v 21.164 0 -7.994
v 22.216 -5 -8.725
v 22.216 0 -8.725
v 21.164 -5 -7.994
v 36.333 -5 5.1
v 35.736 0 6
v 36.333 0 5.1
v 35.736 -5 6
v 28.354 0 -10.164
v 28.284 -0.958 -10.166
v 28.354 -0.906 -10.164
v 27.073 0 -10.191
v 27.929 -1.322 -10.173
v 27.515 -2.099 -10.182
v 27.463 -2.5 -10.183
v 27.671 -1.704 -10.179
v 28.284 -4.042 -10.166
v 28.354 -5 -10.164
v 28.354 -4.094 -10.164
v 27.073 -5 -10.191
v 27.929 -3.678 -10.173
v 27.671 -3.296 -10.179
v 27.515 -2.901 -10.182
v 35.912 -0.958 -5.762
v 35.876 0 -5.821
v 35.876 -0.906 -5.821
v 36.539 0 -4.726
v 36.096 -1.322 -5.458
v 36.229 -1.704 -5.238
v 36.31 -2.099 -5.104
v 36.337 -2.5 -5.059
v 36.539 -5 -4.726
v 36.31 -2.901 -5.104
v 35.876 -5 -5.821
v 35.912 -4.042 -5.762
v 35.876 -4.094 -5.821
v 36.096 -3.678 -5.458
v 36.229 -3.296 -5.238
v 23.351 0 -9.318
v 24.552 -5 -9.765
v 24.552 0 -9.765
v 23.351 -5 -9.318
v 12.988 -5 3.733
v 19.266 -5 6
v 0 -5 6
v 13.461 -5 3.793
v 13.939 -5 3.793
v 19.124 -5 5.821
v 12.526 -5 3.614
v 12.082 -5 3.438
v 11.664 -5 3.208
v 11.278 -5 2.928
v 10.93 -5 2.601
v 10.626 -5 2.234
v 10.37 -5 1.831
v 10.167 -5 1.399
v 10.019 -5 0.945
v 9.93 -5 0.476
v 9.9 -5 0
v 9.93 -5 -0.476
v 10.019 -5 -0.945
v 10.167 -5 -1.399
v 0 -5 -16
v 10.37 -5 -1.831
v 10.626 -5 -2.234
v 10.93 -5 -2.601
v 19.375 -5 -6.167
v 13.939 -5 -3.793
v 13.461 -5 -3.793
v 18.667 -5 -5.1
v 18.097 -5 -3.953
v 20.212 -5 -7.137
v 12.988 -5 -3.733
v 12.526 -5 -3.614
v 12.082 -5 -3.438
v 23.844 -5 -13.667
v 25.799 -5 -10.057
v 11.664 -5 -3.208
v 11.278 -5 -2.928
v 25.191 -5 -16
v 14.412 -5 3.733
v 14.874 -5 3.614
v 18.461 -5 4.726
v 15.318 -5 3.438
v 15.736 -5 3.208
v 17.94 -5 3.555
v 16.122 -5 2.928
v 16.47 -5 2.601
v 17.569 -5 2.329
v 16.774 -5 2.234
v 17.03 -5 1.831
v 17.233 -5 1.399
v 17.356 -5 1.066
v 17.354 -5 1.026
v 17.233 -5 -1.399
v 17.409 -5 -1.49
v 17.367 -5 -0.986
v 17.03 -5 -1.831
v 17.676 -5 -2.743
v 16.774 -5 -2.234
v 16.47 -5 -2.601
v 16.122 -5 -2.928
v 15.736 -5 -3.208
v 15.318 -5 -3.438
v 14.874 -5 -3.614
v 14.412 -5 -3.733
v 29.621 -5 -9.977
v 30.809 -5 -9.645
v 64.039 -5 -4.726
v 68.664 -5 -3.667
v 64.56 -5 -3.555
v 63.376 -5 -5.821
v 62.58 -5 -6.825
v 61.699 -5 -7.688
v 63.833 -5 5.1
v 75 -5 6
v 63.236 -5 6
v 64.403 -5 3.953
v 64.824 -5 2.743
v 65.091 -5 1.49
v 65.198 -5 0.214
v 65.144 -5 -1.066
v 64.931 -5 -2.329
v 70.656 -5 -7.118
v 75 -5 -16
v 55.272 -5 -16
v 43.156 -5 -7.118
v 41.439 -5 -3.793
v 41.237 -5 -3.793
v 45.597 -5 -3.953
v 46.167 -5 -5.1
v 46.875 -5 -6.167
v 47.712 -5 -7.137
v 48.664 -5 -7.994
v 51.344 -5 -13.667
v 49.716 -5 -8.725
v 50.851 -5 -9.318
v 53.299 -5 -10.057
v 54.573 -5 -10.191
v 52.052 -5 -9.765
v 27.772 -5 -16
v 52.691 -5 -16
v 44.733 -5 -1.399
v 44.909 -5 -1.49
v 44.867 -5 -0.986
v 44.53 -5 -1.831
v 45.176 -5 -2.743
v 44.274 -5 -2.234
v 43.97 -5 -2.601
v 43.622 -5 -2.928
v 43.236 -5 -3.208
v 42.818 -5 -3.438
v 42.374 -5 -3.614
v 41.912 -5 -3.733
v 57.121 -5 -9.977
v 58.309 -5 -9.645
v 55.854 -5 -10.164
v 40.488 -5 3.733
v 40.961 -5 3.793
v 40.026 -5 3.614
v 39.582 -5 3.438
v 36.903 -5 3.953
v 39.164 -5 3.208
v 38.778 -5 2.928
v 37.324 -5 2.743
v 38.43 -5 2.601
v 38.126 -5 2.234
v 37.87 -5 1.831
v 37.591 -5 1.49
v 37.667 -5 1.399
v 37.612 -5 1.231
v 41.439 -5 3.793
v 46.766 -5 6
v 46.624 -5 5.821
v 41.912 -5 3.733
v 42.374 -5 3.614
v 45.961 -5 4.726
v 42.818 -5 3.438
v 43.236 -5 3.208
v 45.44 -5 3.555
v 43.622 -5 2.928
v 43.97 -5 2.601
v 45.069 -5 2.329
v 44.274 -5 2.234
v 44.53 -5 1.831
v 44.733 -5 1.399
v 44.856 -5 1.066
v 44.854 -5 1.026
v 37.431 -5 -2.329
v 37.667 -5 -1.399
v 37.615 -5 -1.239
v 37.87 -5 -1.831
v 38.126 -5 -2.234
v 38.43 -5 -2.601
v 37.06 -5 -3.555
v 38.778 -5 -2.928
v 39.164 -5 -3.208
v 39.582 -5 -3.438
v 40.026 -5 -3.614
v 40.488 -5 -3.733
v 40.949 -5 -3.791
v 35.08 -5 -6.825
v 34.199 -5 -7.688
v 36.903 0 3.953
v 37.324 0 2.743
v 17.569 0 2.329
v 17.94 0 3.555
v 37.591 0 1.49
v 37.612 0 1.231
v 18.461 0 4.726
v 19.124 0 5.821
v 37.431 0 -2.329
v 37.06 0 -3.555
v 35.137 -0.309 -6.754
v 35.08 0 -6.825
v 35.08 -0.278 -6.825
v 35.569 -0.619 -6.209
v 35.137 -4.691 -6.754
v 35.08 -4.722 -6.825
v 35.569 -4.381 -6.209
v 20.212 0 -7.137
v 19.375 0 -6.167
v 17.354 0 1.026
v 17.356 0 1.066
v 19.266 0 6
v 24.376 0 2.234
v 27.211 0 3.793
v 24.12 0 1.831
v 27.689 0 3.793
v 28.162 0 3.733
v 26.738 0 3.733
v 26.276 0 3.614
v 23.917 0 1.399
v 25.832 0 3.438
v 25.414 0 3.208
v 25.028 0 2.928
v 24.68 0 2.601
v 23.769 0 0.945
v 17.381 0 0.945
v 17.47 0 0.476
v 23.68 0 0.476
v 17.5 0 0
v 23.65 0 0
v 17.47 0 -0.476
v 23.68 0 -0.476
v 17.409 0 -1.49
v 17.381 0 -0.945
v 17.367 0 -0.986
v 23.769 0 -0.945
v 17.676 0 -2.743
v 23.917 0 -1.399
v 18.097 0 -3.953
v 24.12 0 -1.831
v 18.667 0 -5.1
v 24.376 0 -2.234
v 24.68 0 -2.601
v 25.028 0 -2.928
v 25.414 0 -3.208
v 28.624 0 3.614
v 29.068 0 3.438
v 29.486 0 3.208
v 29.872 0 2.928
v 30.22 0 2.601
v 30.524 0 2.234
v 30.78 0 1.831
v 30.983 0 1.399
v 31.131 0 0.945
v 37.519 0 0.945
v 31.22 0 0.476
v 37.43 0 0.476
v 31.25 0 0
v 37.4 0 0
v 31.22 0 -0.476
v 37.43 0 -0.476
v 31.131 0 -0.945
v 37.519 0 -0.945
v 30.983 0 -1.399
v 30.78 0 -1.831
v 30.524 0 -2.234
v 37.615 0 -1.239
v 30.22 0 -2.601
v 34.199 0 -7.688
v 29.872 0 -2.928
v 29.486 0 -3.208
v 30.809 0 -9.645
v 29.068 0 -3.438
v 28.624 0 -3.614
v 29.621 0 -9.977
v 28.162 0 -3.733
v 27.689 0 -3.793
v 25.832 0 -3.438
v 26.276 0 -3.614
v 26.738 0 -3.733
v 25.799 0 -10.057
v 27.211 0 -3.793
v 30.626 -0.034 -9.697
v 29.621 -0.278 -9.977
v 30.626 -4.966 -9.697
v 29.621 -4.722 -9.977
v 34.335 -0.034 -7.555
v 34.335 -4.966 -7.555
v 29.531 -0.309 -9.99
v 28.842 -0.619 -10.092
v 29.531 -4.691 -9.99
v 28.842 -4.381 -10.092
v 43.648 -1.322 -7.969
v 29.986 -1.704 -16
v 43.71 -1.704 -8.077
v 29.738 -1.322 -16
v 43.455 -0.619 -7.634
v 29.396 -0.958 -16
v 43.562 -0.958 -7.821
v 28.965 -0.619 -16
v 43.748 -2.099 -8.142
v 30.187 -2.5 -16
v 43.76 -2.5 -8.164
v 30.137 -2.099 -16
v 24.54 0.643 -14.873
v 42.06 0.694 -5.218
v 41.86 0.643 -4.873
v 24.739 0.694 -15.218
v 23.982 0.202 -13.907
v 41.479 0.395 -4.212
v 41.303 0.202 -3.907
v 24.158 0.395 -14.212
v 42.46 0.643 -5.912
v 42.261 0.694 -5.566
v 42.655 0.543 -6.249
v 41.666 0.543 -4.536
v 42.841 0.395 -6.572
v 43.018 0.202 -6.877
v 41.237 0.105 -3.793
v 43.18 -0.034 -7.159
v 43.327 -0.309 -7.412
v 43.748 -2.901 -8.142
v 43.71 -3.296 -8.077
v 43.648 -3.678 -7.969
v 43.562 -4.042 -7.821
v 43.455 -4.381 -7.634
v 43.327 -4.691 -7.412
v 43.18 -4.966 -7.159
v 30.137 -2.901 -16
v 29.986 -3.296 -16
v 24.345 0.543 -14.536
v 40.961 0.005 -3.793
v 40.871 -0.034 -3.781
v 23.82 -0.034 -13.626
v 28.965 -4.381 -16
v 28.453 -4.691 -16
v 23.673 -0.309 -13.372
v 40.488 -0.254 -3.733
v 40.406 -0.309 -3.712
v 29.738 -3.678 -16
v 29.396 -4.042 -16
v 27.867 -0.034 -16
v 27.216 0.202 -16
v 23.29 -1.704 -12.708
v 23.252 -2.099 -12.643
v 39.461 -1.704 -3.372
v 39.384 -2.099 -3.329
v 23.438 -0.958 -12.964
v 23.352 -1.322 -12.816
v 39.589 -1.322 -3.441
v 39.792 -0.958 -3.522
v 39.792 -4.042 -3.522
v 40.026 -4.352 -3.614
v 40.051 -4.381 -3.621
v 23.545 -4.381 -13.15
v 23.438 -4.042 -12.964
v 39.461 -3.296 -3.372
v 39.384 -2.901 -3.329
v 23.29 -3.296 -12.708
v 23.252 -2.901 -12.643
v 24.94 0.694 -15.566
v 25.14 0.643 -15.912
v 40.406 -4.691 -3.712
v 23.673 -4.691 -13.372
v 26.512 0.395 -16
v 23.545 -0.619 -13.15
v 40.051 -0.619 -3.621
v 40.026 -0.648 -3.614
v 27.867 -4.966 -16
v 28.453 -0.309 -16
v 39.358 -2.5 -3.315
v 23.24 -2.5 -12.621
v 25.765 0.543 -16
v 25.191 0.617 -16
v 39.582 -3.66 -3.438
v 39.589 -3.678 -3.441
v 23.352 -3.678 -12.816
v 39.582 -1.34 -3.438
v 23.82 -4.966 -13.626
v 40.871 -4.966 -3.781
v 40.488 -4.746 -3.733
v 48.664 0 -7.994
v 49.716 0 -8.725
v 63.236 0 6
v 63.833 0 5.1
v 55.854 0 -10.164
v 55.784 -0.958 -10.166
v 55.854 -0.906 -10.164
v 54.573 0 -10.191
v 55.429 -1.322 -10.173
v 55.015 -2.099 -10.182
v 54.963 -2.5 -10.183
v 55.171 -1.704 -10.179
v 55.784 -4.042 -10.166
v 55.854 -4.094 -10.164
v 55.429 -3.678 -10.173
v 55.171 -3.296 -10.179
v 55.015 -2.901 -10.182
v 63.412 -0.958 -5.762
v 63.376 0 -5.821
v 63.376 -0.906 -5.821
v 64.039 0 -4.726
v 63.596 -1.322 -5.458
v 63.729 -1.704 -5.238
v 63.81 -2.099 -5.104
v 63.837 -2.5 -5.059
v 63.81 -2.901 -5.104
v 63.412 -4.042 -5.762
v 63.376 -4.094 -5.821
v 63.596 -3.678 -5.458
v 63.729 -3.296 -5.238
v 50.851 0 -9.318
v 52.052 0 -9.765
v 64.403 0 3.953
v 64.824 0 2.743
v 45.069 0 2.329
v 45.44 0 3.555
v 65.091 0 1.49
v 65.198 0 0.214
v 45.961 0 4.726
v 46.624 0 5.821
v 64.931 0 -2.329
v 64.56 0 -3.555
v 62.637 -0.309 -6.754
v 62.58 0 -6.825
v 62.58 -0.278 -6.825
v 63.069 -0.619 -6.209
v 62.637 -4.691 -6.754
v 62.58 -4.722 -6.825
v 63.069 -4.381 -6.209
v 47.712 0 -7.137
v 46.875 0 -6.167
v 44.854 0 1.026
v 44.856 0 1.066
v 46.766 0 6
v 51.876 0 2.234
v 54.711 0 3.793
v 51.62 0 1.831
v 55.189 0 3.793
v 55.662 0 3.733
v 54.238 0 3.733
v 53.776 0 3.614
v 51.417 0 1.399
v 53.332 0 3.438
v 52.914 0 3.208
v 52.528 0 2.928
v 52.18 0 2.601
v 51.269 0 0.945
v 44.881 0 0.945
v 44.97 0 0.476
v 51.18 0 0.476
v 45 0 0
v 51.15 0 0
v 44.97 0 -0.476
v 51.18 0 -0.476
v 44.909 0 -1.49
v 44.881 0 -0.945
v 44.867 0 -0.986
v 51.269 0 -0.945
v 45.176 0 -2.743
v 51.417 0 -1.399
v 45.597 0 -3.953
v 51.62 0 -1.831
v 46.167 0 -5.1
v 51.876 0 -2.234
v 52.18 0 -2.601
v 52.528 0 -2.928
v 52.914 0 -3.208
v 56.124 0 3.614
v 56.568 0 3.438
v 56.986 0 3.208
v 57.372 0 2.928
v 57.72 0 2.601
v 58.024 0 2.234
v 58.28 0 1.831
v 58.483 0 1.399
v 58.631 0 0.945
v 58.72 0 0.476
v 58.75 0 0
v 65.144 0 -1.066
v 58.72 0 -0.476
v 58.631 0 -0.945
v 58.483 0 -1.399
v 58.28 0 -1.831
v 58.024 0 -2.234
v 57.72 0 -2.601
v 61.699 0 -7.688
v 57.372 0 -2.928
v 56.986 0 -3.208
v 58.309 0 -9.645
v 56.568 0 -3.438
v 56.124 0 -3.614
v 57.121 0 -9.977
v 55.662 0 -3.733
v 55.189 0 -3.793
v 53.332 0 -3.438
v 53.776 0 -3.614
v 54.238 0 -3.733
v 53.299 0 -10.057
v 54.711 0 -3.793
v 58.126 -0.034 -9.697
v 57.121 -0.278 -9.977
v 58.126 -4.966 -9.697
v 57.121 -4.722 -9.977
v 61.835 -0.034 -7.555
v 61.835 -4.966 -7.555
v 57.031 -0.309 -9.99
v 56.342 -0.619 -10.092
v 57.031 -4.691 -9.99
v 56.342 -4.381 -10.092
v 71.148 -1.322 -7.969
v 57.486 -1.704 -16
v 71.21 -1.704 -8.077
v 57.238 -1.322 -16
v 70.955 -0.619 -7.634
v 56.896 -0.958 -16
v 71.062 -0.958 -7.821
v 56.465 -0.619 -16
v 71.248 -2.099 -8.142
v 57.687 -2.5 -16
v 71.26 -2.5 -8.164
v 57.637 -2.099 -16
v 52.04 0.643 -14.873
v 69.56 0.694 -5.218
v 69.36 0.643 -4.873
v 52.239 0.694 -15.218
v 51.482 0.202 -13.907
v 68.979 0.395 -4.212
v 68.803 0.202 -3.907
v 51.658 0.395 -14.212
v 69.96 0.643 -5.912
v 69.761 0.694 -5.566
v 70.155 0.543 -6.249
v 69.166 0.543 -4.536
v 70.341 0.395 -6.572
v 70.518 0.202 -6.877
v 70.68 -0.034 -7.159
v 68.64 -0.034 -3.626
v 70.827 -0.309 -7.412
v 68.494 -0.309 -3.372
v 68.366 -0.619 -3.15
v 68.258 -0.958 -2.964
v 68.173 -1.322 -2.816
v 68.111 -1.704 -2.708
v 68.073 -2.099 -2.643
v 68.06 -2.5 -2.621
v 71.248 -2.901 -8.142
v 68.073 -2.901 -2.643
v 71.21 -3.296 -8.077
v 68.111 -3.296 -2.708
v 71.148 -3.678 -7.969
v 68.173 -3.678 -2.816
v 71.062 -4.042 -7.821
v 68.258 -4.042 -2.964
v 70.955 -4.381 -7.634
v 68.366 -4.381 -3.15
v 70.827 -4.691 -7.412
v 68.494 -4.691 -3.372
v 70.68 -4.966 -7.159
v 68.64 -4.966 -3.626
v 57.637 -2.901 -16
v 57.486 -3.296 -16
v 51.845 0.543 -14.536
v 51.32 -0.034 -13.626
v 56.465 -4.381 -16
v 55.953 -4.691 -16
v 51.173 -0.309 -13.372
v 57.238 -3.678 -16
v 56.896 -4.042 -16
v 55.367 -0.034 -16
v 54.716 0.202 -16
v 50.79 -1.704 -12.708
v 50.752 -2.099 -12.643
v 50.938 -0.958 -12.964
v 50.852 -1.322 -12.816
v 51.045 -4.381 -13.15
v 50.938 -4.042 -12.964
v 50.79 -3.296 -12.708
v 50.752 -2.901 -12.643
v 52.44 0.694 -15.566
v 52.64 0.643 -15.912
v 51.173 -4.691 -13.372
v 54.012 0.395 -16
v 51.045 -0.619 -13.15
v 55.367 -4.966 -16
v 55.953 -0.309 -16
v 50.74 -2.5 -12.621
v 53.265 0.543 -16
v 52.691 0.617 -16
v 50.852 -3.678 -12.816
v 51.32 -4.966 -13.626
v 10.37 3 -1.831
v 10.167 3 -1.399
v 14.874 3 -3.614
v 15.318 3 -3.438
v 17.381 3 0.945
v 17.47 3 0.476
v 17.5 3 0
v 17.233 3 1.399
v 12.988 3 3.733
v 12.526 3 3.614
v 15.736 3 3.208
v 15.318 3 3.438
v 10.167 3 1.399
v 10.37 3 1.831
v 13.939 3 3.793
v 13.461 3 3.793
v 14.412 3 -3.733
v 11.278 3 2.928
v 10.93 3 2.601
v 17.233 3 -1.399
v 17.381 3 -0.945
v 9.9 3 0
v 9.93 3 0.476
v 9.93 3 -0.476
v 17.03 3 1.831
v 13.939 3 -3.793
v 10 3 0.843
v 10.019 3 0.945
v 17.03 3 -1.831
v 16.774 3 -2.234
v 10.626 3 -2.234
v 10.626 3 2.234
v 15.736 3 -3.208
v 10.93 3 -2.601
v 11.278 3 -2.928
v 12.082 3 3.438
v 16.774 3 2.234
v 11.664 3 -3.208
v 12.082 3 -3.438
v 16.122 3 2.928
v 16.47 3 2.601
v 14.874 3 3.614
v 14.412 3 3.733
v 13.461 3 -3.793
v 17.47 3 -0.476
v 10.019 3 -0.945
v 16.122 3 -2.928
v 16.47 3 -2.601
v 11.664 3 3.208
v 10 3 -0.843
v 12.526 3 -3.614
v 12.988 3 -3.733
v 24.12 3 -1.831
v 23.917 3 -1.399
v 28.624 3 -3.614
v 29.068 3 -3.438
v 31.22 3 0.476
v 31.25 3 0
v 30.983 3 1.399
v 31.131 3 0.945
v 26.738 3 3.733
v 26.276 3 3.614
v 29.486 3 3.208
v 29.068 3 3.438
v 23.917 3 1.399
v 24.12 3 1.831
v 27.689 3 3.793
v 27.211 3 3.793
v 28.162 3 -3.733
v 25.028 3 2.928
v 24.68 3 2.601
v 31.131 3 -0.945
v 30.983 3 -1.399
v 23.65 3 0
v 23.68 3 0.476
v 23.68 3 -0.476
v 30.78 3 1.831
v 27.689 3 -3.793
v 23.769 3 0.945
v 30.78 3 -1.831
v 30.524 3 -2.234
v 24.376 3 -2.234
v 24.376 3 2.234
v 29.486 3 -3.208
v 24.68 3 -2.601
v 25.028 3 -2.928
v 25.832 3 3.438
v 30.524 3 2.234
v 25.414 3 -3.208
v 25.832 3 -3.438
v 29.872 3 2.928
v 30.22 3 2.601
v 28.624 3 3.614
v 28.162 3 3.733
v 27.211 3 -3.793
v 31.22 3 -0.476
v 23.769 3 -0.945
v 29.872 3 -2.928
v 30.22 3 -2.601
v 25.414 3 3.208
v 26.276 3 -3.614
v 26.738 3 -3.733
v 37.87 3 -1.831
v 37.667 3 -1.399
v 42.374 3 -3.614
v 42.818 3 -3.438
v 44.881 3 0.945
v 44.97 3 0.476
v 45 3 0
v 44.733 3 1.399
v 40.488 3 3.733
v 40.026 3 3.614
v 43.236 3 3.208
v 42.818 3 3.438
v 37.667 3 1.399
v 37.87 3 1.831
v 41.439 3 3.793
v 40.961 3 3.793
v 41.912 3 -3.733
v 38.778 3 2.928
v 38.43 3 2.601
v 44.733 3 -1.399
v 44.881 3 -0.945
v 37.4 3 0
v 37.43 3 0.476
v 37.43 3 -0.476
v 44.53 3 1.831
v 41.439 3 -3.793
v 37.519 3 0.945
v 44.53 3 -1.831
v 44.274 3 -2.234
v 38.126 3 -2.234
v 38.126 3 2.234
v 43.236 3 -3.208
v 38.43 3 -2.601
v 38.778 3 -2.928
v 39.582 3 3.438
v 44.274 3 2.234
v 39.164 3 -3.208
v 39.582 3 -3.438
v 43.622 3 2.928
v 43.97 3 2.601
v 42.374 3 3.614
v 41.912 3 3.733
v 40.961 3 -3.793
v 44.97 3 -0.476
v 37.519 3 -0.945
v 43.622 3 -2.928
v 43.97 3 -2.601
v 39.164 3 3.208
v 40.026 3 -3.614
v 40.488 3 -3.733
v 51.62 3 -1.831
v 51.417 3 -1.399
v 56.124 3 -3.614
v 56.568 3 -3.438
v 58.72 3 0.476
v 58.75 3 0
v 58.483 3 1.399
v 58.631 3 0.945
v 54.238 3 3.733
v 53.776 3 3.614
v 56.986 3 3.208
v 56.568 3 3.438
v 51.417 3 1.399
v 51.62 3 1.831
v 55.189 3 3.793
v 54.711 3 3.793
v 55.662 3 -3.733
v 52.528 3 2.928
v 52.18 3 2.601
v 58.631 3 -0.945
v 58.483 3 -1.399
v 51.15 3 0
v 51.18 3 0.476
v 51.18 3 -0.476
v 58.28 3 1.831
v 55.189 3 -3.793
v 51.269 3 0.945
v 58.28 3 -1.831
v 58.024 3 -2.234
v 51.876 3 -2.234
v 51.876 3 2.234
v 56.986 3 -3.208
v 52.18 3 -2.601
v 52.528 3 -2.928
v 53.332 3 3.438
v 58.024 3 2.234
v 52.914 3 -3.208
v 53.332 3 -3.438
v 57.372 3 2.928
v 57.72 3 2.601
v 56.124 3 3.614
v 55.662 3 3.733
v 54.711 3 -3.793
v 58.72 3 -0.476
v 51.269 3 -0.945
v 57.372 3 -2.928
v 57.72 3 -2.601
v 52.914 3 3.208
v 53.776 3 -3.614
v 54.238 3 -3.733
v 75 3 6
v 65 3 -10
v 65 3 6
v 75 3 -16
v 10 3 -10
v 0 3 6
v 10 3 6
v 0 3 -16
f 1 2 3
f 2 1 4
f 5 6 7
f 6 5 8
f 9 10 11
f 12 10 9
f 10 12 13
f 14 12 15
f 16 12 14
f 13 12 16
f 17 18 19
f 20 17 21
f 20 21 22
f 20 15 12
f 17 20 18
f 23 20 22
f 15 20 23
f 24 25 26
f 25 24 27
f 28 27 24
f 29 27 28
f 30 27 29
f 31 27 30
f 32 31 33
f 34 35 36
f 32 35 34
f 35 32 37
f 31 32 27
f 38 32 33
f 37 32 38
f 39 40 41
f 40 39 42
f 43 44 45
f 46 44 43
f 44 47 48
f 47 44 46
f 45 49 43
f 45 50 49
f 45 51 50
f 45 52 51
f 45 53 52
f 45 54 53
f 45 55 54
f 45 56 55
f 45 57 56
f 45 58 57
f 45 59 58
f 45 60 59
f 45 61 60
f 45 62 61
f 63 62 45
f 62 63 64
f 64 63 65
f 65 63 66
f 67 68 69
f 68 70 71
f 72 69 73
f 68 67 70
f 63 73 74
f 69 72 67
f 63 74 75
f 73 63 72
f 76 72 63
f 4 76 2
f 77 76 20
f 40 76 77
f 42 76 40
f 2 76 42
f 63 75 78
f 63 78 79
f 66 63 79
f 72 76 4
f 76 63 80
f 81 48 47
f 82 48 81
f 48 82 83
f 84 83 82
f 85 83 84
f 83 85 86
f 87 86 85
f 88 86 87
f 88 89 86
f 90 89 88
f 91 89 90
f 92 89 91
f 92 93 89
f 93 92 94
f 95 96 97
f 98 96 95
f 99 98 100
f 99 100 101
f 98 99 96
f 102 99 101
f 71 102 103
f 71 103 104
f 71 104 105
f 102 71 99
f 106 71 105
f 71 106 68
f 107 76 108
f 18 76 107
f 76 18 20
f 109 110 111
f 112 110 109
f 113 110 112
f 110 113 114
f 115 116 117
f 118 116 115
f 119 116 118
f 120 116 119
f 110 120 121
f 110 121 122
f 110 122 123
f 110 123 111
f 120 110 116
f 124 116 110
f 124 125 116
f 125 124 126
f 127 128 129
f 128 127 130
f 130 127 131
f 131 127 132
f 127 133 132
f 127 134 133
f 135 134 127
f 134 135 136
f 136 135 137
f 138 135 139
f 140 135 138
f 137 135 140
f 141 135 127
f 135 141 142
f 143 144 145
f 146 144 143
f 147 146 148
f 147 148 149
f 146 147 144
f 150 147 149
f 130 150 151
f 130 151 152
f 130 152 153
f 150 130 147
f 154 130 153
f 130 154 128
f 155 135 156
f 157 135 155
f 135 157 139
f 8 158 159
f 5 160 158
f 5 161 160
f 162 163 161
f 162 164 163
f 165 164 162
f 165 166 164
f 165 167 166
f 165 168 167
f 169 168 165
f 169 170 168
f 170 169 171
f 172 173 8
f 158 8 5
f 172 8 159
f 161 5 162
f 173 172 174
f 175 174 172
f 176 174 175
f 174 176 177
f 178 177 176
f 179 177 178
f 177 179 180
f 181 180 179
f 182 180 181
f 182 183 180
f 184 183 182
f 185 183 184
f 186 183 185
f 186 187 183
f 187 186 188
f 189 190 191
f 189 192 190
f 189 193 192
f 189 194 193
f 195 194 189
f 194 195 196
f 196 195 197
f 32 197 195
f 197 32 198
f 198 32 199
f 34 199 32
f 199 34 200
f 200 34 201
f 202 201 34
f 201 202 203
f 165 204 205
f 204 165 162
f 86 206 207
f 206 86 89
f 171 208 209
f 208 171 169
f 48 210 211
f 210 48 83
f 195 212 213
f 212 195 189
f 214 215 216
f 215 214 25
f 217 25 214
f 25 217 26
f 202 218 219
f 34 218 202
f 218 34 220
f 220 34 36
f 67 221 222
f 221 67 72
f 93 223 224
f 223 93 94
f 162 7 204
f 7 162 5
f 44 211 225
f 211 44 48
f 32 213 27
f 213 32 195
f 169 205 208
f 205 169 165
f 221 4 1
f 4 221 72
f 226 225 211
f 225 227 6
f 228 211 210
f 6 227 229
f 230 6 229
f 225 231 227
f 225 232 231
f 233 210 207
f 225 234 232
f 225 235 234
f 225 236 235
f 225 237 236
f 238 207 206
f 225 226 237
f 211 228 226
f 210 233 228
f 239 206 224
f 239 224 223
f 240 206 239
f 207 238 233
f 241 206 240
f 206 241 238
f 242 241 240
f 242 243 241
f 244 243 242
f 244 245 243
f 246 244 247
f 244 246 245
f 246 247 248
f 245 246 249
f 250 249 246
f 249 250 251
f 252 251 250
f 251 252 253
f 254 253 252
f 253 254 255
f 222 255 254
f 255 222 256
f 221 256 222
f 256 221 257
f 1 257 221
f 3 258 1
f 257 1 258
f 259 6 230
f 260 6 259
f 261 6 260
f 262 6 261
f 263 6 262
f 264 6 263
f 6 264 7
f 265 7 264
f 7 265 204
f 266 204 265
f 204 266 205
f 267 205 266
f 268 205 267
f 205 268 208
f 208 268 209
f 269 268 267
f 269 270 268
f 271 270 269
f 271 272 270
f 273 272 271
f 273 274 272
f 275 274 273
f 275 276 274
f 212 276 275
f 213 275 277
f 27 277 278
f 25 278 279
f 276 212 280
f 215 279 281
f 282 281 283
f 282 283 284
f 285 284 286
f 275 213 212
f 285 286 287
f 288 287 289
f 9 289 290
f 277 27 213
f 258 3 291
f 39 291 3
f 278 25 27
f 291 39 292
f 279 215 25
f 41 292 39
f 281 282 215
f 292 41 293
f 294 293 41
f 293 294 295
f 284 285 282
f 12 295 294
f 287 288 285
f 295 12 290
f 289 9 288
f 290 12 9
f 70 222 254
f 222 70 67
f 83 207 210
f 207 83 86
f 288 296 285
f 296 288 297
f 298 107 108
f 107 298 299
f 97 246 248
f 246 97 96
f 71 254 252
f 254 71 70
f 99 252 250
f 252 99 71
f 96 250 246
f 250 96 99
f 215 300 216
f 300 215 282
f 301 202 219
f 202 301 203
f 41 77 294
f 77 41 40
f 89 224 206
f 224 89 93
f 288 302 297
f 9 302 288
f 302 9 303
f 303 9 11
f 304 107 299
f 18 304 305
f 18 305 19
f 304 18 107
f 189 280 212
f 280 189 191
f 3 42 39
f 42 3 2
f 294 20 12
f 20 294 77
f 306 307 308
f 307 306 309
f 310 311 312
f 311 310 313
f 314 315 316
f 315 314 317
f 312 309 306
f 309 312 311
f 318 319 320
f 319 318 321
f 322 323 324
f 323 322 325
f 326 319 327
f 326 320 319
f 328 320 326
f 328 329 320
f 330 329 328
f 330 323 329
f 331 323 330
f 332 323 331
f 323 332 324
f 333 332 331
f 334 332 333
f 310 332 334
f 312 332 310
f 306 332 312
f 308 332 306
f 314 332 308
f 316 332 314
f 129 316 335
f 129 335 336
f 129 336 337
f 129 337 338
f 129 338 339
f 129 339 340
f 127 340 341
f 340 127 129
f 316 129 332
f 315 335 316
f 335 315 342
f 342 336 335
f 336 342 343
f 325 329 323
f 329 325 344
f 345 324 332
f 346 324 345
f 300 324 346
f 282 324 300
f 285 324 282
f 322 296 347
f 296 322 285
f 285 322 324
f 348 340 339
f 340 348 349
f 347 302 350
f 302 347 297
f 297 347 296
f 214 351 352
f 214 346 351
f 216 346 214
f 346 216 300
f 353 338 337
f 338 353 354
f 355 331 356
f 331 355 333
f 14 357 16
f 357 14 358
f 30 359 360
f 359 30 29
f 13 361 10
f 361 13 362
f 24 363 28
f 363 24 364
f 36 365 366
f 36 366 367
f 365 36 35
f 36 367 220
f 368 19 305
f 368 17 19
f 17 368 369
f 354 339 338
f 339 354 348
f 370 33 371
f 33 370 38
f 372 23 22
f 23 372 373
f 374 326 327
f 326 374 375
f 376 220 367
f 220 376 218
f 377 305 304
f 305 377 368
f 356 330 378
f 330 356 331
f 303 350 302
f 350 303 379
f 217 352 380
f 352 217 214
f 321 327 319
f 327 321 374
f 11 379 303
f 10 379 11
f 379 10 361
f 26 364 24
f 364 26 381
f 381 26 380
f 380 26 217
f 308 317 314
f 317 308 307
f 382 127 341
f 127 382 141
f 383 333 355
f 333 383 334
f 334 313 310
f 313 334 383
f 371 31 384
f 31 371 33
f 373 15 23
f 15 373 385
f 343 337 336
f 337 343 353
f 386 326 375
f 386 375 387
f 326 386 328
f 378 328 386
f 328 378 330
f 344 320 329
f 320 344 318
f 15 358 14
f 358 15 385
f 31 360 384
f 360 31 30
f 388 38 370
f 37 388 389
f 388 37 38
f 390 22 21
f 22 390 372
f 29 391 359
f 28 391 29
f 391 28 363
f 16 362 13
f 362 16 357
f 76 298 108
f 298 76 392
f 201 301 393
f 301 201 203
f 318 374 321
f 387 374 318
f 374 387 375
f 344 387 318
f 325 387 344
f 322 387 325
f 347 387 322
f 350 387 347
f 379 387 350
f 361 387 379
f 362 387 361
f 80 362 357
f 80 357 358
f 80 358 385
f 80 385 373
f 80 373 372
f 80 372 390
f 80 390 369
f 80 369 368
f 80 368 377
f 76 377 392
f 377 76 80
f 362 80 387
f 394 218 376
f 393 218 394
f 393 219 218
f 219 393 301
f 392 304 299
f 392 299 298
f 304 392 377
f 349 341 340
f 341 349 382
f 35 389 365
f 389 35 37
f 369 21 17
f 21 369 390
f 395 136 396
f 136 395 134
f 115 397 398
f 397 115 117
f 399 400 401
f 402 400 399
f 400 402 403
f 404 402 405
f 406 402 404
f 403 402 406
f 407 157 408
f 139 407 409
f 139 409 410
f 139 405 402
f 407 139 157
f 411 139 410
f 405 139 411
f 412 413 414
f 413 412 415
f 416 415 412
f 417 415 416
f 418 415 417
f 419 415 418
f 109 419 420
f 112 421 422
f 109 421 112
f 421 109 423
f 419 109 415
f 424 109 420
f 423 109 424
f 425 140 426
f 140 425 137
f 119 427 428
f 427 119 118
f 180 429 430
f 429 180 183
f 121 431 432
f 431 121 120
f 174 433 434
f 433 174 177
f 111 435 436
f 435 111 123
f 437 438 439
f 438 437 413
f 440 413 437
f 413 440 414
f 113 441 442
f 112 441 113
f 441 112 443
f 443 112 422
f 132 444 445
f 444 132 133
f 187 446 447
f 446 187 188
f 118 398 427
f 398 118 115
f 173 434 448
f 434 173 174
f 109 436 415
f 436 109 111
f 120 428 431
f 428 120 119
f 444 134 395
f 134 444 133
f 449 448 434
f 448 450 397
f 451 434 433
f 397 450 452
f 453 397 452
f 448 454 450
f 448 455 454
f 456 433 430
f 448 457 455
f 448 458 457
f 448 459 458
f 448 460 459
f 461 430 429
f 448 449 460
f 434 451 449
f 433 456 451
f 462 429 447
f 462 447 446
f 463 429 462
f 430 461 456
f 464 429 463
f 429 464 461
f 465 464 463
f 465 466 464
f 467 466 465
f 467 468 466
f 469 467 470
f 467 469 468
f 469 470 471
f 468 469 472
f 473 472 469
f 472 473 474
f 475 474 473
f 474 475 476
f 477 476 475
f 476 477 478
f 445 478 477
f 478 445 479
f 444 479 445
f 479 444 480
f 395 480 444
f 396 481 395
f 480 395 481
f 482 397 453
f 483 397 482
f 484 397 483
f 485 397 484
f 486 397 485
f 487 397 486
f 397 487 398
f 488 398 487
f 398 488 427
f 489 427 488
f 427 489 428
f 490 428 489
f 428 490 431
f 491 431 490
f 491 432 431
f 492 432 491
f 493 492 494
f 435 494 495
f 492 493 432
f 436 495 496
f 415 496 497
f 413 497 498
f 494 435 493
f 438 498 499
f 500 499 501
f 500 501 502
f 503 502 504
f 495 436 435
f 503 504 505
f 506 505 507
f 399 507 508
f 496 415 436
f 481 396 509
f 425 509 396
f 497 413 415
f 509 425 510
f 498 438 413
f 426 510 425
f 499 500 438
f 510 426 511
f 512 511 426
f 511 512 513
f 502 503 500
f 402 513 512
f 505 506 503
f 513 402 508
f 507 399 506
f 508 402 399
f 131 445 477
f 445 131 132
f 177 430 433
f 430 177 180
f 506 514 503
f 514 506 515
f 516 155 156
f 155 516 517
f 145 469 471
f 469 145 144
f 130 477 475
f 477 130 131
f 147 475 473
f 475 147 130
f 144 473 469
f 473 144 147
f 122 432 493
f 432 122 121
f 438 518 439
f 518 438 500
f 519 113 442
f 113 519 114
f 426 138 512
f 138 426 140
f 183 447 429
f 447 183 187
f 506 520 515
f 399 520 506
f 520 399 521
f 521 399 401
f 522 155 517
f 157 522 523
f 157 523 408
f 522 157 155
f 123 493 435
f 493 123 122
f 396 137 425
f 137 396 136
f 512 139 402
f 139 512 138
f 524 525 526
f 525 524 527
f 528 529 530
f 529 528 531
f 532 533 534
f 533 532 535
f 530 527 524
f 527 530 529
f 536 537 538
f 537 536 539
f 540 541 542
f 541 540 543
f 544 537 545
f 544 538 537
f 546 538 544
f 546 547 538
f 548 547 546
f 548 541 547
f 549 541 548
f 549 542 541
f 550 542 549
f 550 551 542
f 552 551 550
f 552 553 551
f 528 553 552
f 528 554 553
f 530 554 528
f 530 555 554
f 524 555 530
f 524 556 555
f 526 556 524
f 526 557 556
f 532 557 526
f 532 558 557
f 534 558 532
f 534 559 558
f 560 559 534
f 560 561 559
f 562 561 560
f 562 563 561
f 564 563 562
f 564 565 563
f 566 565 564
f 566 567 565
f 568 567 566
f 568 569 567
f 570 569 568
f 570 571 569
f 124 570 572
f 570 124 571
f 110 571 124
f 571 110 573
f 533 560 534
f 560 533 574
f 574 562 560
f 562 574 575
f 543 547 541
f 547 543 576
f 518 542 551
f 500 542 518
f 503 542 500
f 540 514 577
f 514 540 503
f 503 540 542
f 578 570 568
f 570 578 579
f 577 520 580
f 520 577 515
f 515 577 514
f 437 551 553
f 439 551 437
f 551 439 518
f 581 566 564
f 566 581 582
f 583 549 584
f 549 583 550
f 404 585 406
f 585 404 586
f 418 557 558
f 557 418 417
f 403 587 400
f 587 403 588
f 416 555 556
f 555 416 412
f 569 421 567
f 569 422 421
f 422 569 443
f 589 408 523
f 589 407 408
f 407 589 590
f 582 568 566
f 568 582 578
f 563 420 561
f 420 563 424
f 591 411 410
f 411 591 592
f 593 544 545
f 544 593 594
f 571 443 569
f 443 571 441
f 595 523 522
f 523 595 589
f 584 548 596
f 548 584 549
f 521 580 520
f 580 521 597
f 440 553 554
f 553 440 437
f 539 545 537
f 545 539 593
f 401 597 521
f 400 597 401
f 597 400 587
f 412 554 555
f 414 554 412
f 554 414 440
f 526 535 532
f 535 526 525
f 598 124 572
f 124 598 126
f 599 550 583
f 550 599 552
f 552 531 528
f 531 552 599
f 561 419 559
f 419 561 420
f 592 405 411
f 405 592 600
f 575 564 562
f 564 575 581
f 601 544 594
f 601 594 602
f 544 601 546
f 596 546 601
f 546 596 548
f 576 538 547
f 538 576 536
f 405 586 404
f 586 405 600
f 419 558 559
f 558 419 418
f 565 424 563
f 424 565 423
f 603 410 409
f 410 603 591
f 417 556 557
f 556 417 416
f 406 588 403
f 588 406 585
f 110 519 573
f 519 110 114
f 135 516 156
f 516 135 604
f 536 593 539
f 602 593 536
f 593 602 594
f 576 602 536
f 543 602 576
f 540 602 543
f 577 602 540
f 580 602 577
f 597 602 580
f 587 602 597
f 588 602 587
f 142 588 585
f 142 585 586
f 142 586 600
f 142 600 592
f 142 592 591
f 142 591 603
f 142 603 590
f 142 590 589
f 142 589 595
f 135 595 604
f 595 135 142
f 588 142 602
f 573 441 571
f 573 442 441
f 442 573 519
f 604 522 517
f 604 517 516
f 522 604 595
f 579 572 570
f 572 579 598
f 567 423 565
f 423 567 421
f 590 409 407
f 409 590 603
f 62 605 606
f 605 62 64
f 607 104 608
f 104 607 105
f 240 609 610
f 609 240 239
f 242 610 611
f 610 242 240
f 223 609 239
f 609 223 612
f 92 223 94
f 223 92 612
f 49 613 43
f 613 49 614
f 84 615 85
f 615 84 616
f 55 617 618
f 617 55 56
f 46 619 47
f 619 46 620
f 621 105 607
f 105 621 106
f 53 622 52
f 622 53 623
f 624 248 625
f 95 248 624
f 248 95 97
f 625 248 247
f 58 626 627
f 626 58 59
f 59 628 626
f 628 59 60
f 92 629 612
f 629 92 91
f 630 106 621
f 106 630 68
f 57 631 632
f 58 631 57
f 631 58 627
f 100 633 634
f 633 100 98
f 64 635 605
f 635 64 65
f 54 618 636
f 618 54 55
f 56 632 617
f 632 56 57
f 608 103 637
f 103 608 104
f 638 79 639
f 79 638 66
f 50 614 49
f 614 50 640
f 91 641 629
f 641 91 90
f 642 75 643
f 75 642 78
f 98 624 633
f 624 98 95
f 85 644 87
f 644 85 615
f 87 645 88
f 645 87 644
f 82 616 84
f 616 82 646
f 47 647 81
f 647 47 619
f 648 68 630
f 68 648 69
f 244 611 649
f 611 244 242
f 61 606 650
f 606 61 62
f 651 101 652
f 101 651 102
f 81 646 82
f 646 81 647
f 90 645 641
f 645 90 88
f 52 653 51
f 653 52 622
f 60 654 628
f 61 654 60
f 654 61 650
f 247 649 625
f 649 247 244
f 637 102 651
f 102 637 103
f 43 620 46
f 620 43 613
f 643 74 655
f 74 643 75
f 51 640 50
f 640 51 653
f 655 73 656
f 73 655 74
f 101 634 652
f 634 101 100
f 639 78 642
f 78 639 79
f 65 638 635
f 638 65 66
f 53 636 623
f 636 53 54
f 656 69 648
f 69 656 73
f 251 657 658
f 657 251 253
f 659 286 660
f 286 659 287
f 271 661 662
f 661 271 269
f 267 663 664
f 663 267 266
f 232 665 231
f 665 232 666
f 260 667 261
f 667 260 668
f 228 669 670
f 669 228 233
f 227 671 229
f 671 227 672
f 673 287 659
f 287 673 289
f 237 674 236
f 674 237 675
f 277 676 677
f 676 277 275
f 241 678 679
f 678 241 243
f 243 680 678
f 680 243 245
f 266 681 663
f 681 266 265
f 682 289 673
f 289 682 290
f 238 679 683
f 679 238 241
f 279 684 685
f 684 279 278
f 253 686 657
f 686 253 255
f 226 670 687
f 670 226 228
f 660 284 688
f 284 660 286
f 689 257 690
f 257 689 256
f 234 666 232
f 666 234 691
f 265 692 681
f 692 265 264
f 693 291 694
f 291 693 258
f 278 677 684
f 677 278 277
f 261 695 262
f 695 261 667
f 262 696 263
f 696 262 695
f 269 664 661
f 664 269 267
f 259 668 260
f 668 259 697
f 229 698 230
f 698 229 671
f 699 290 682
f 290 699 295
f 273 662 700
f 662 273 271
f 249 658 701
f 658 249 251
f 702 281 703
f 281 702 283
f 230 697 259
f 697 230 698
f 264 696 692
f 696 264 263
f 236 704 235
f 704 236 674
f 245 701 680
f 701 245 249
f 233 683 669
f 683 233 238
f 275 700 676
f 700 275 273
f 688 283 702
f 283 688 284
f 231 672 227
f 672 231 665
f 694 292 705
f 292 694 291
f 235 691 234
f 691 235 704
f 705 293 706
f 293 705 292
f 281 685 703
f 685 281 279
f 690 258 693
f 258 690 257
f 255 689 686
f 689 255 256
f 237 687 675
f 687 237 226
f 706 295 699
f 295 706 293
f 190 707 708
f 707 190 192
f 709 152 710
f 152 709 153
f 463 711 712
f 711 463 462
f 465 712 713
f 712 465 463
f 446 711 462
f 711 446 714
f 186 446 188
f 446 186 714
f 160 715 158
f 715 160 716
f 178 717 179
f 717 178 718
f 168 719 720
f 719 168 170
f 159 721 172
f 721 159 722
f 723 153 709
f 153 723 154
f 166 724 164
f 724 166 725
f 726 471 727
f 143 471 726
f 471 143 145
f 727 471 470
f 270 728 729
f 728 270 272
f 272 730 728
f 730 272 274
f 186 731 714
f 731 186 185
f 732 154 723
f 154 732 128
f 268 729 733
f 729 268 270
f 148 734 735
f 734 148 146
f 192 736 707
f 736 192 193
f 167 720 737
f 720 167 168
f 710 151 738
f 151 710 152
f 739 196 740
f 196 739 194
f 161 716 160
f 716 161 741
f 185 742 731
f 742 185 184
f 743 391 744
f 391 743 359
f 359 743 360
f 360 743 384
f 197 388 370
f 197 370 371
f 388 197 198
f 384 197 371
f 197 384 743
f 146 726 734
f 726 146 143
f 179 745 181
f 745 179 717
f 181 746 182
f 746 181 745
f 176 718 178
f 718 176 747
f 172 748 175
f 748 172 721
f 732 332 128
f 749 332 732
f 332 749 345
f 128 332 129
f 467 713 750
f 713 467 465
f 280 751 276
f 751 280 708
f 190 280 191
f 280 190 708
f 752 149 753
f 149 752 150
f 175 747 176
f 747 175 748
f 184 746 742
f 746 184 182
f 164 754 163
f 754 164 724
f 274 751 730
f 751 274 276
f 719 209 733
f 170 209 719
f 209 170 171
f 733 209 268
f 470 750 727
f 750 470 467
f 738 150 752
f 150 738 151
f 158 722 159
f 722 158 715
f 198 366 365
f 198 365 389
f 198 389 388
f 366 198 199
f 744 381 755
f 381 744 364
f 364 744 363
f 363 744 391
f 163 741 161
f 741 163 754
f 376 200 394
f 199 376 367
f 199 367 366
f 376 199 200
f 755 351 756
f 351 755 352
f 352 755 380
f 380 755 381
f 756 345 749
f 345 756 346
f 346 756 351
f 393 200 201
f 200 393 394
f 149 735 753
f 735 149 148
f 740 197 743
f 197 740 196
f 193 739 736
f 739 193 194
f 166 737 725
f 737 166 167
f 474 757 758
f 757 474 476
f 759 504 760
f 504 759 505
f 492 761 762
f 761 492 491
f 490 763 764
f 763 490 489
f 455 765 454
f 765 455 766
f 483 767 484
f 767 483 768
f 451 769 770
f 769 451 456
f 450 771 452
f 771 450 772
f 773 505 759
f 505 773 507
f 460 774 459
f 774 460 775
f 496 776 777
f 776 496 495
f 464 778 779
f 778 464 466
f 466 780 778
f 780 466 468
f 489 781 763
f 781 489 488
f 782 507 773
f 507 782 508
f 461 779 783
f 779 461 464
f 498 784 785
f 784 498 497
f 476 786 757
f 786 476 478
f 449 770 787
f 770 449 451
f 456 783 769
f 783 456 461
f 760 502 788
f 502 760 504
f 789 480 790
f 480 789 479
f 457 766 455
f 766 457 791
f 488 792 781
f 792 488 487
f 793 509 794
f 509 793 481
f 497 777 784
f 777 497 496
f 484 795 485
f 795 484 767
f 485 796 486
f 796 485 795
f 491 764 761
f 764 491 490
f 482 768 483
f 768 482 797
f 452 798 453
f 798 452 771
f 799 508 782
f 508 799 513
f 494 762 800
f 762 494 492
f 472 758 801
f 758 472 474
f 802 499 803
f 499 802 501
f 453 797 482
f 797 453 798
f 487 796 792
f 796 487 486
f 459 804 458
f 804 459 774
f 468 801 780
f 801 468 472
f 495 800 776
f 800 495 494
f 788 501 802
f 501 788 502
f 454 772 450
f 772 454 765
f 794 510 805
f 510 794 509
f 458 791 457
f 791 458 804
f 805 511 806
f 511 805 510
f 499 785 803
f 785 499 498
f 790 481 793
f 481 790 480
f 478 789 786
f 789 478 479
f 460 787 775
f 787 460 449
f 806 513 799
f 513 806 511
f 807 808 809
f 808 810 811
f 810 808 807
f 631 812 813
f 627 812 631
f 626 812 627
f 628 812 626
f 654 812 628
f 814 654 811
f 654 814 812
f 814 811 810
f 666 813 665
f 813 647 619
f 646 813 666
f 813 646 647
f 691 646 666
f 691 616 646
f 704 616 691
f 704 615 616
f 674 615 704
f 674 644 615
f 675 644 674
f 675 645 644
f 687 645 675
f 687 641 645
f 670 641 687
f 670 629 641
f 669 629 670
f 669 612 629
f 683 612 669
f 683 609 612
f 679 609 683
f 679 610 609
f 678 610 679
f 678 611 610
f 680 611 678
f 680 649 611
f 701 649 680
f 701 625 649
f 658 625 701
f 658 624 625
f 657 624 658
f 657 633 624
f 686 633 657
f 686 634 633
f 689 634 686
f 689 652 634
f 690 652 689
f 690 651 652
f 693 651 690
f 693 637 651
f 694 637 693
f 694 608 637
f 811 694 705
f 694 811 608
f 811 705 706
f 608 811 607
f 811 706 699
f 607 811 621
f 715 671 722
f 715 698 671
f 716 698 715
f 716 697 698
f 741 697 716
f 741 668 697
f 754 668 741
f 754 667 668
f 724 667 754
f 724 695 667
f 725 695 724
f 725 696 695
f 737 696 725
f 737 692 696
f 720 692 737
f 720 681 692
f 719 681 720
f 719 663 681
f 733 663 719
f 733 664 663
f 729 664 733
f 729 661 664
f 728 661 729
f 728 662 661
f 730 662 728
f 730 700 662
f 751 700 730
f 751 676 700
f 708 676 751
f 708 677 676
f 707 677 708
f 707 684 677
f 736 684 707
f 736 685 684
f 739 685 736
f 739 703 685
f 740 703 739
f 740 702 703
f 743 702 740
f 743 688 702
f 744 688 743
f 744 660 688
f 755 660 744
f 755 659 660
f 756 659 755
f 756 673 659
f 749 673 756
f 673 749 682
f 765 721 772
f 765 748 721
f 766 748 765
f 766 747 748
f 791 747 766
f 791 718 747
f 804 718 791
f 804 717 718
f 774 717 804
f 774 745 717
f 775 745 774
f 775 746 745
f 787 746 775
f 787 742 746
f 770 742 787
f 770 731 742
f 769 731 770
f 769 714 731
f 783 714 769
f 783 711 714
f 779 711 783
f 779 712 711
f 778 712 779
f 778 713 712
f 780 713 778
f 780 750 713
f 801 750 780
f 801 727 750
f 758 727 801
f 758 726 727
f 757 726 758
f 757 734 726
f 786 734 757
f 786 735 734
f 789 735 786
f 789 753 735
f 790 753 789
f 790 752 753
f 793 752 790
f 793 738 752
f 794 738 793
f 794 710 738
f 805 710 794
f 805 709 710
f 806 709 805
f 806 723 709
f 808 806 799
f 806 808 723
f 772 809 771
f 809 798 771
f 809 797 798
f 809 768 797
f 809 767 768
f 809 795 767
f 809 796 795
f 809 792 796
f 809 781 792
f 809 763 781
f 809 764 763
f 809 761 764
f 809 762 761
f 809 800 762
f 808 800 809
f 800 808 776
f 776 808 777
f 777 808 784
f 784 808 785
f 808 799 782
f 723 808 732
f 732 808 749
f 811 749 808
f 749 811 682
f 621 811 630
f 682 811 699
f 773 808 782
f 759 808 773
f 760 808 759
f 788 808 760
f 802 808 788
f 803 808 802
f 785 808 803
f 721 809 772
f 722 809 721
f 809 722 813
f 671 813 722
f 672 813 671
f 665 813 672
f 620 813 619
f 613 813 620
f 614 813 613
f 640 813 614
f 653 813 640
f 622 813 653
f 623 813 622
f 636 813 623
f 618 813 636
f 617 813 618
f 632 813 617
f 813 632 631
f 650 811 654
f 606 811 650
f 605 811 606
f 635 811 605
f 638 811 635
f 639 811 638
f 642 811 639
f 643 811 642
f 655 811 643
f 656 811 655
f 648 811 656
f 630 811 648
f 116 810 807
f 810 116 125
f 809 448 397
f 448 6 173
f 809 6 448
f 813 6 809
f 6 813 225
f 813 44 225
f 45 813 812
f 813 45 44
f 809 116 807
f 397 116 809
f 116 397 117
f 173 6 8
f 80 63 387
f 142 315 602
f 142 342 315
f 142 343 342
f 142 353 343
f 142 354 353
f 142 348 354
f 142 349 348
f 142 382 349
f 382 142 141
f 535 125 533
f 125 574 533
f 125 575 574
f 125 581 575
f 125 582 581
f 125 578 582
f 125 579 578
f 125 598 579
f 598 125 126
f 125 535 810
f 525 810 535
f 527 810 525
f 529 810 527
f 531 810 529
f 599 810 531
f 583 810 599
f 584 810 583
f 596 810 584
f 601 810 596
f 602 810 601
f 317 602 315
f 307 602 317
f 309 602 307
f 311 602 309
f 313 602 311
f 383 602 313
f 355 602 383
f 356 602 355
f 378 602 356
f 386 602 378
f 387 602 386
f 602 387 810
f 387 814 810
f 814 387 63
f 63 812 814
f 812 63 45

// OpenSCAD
$fn = 50;

kSp = 13.75;
nKeys = 4;//12;//60;//5;

spH = 5;
spR = 10;

wrmH = 20;
wrmR = 3;

sqSide = 25.4/8;
sqLen = 40;

skew = 0;//-15;
boreR = 5;

thrH = 1;

prEps = 0.2;
//fineTunerAssy();
difference(){
    translate([0,-5,-16]) cube([kSp*nKeys+20,8,22]);//cube([180,8,22]);//cube([180,5,22]);
    fineTunerAssy();
}

module fineTunerAssy(){

for (i = [1:1:nKeys]) {
    rInd = i%2;
    translate([kSp*i-rInd*25*sin(skew),rInd*25,0]) rotate([0,0,skew]) rotate([0,-30,0]) wormAsy();
    translate([spR+3.7+kSp*i-13.75,10,0]) rotate([90,0,0]) cylinder(40,3.6+prEps,3.6+prEps);
    //translate([kSp*i-rInd*25*sin(skew),rInd*25,0]) rotate([90,0,skew]) cylinder(spH,spR,spR);
    //translate([kSp*i-rInd*25*sin(skew),rInd*25,-spR-wrmR]) rotate([0,90,skew]) translate([0,-2.5,-wrmH/2]) cylinder(wrmH,wrmR,wrmR);
    translate([kSp*i,0,0]) rotate([0,0,skew]) translate([-sqSide/2,-10,-sqSide/2]) cube([sqSide,sqLen,sqSide]);
}
color("gray",0.3) translate([10,-22,-10]) cube([13.75*nKeys,14,20]);
color("gray",0.3) translate([10,28,-10]) cube([13.75*nKeys,14,20]);
color("blue",0.5) difference(){
    translate([10,3,-10]) cube([13.75*nKeys,14,20]);
    daHolz();//translate([16.5,10,-20]) cylinder(100,5,5);
}

}

module daHolz(){
    for (i = [1:1:nKeys]) {
        translate([16.5+i*kSp-kSp-2.5,10,-20]) cylinder(100,5,5);
        //translate([16.5+i*kSp-kSp-2.5,10,-20+0]) cylinder(100,8,5);
    }
}

module wormAsy(){
    translate([0,0,0]) rotate([90,0,0]) cylinder(spH,spR+prEps,spR+prEps);
    translate([0,0,-spR-wrmR+thrH]) rotate([0,90,0]) translate([0,-2.5,-wrmH/2]) cylinder(wrmH,wrmR+prEps,wrmR+prEps);
}
